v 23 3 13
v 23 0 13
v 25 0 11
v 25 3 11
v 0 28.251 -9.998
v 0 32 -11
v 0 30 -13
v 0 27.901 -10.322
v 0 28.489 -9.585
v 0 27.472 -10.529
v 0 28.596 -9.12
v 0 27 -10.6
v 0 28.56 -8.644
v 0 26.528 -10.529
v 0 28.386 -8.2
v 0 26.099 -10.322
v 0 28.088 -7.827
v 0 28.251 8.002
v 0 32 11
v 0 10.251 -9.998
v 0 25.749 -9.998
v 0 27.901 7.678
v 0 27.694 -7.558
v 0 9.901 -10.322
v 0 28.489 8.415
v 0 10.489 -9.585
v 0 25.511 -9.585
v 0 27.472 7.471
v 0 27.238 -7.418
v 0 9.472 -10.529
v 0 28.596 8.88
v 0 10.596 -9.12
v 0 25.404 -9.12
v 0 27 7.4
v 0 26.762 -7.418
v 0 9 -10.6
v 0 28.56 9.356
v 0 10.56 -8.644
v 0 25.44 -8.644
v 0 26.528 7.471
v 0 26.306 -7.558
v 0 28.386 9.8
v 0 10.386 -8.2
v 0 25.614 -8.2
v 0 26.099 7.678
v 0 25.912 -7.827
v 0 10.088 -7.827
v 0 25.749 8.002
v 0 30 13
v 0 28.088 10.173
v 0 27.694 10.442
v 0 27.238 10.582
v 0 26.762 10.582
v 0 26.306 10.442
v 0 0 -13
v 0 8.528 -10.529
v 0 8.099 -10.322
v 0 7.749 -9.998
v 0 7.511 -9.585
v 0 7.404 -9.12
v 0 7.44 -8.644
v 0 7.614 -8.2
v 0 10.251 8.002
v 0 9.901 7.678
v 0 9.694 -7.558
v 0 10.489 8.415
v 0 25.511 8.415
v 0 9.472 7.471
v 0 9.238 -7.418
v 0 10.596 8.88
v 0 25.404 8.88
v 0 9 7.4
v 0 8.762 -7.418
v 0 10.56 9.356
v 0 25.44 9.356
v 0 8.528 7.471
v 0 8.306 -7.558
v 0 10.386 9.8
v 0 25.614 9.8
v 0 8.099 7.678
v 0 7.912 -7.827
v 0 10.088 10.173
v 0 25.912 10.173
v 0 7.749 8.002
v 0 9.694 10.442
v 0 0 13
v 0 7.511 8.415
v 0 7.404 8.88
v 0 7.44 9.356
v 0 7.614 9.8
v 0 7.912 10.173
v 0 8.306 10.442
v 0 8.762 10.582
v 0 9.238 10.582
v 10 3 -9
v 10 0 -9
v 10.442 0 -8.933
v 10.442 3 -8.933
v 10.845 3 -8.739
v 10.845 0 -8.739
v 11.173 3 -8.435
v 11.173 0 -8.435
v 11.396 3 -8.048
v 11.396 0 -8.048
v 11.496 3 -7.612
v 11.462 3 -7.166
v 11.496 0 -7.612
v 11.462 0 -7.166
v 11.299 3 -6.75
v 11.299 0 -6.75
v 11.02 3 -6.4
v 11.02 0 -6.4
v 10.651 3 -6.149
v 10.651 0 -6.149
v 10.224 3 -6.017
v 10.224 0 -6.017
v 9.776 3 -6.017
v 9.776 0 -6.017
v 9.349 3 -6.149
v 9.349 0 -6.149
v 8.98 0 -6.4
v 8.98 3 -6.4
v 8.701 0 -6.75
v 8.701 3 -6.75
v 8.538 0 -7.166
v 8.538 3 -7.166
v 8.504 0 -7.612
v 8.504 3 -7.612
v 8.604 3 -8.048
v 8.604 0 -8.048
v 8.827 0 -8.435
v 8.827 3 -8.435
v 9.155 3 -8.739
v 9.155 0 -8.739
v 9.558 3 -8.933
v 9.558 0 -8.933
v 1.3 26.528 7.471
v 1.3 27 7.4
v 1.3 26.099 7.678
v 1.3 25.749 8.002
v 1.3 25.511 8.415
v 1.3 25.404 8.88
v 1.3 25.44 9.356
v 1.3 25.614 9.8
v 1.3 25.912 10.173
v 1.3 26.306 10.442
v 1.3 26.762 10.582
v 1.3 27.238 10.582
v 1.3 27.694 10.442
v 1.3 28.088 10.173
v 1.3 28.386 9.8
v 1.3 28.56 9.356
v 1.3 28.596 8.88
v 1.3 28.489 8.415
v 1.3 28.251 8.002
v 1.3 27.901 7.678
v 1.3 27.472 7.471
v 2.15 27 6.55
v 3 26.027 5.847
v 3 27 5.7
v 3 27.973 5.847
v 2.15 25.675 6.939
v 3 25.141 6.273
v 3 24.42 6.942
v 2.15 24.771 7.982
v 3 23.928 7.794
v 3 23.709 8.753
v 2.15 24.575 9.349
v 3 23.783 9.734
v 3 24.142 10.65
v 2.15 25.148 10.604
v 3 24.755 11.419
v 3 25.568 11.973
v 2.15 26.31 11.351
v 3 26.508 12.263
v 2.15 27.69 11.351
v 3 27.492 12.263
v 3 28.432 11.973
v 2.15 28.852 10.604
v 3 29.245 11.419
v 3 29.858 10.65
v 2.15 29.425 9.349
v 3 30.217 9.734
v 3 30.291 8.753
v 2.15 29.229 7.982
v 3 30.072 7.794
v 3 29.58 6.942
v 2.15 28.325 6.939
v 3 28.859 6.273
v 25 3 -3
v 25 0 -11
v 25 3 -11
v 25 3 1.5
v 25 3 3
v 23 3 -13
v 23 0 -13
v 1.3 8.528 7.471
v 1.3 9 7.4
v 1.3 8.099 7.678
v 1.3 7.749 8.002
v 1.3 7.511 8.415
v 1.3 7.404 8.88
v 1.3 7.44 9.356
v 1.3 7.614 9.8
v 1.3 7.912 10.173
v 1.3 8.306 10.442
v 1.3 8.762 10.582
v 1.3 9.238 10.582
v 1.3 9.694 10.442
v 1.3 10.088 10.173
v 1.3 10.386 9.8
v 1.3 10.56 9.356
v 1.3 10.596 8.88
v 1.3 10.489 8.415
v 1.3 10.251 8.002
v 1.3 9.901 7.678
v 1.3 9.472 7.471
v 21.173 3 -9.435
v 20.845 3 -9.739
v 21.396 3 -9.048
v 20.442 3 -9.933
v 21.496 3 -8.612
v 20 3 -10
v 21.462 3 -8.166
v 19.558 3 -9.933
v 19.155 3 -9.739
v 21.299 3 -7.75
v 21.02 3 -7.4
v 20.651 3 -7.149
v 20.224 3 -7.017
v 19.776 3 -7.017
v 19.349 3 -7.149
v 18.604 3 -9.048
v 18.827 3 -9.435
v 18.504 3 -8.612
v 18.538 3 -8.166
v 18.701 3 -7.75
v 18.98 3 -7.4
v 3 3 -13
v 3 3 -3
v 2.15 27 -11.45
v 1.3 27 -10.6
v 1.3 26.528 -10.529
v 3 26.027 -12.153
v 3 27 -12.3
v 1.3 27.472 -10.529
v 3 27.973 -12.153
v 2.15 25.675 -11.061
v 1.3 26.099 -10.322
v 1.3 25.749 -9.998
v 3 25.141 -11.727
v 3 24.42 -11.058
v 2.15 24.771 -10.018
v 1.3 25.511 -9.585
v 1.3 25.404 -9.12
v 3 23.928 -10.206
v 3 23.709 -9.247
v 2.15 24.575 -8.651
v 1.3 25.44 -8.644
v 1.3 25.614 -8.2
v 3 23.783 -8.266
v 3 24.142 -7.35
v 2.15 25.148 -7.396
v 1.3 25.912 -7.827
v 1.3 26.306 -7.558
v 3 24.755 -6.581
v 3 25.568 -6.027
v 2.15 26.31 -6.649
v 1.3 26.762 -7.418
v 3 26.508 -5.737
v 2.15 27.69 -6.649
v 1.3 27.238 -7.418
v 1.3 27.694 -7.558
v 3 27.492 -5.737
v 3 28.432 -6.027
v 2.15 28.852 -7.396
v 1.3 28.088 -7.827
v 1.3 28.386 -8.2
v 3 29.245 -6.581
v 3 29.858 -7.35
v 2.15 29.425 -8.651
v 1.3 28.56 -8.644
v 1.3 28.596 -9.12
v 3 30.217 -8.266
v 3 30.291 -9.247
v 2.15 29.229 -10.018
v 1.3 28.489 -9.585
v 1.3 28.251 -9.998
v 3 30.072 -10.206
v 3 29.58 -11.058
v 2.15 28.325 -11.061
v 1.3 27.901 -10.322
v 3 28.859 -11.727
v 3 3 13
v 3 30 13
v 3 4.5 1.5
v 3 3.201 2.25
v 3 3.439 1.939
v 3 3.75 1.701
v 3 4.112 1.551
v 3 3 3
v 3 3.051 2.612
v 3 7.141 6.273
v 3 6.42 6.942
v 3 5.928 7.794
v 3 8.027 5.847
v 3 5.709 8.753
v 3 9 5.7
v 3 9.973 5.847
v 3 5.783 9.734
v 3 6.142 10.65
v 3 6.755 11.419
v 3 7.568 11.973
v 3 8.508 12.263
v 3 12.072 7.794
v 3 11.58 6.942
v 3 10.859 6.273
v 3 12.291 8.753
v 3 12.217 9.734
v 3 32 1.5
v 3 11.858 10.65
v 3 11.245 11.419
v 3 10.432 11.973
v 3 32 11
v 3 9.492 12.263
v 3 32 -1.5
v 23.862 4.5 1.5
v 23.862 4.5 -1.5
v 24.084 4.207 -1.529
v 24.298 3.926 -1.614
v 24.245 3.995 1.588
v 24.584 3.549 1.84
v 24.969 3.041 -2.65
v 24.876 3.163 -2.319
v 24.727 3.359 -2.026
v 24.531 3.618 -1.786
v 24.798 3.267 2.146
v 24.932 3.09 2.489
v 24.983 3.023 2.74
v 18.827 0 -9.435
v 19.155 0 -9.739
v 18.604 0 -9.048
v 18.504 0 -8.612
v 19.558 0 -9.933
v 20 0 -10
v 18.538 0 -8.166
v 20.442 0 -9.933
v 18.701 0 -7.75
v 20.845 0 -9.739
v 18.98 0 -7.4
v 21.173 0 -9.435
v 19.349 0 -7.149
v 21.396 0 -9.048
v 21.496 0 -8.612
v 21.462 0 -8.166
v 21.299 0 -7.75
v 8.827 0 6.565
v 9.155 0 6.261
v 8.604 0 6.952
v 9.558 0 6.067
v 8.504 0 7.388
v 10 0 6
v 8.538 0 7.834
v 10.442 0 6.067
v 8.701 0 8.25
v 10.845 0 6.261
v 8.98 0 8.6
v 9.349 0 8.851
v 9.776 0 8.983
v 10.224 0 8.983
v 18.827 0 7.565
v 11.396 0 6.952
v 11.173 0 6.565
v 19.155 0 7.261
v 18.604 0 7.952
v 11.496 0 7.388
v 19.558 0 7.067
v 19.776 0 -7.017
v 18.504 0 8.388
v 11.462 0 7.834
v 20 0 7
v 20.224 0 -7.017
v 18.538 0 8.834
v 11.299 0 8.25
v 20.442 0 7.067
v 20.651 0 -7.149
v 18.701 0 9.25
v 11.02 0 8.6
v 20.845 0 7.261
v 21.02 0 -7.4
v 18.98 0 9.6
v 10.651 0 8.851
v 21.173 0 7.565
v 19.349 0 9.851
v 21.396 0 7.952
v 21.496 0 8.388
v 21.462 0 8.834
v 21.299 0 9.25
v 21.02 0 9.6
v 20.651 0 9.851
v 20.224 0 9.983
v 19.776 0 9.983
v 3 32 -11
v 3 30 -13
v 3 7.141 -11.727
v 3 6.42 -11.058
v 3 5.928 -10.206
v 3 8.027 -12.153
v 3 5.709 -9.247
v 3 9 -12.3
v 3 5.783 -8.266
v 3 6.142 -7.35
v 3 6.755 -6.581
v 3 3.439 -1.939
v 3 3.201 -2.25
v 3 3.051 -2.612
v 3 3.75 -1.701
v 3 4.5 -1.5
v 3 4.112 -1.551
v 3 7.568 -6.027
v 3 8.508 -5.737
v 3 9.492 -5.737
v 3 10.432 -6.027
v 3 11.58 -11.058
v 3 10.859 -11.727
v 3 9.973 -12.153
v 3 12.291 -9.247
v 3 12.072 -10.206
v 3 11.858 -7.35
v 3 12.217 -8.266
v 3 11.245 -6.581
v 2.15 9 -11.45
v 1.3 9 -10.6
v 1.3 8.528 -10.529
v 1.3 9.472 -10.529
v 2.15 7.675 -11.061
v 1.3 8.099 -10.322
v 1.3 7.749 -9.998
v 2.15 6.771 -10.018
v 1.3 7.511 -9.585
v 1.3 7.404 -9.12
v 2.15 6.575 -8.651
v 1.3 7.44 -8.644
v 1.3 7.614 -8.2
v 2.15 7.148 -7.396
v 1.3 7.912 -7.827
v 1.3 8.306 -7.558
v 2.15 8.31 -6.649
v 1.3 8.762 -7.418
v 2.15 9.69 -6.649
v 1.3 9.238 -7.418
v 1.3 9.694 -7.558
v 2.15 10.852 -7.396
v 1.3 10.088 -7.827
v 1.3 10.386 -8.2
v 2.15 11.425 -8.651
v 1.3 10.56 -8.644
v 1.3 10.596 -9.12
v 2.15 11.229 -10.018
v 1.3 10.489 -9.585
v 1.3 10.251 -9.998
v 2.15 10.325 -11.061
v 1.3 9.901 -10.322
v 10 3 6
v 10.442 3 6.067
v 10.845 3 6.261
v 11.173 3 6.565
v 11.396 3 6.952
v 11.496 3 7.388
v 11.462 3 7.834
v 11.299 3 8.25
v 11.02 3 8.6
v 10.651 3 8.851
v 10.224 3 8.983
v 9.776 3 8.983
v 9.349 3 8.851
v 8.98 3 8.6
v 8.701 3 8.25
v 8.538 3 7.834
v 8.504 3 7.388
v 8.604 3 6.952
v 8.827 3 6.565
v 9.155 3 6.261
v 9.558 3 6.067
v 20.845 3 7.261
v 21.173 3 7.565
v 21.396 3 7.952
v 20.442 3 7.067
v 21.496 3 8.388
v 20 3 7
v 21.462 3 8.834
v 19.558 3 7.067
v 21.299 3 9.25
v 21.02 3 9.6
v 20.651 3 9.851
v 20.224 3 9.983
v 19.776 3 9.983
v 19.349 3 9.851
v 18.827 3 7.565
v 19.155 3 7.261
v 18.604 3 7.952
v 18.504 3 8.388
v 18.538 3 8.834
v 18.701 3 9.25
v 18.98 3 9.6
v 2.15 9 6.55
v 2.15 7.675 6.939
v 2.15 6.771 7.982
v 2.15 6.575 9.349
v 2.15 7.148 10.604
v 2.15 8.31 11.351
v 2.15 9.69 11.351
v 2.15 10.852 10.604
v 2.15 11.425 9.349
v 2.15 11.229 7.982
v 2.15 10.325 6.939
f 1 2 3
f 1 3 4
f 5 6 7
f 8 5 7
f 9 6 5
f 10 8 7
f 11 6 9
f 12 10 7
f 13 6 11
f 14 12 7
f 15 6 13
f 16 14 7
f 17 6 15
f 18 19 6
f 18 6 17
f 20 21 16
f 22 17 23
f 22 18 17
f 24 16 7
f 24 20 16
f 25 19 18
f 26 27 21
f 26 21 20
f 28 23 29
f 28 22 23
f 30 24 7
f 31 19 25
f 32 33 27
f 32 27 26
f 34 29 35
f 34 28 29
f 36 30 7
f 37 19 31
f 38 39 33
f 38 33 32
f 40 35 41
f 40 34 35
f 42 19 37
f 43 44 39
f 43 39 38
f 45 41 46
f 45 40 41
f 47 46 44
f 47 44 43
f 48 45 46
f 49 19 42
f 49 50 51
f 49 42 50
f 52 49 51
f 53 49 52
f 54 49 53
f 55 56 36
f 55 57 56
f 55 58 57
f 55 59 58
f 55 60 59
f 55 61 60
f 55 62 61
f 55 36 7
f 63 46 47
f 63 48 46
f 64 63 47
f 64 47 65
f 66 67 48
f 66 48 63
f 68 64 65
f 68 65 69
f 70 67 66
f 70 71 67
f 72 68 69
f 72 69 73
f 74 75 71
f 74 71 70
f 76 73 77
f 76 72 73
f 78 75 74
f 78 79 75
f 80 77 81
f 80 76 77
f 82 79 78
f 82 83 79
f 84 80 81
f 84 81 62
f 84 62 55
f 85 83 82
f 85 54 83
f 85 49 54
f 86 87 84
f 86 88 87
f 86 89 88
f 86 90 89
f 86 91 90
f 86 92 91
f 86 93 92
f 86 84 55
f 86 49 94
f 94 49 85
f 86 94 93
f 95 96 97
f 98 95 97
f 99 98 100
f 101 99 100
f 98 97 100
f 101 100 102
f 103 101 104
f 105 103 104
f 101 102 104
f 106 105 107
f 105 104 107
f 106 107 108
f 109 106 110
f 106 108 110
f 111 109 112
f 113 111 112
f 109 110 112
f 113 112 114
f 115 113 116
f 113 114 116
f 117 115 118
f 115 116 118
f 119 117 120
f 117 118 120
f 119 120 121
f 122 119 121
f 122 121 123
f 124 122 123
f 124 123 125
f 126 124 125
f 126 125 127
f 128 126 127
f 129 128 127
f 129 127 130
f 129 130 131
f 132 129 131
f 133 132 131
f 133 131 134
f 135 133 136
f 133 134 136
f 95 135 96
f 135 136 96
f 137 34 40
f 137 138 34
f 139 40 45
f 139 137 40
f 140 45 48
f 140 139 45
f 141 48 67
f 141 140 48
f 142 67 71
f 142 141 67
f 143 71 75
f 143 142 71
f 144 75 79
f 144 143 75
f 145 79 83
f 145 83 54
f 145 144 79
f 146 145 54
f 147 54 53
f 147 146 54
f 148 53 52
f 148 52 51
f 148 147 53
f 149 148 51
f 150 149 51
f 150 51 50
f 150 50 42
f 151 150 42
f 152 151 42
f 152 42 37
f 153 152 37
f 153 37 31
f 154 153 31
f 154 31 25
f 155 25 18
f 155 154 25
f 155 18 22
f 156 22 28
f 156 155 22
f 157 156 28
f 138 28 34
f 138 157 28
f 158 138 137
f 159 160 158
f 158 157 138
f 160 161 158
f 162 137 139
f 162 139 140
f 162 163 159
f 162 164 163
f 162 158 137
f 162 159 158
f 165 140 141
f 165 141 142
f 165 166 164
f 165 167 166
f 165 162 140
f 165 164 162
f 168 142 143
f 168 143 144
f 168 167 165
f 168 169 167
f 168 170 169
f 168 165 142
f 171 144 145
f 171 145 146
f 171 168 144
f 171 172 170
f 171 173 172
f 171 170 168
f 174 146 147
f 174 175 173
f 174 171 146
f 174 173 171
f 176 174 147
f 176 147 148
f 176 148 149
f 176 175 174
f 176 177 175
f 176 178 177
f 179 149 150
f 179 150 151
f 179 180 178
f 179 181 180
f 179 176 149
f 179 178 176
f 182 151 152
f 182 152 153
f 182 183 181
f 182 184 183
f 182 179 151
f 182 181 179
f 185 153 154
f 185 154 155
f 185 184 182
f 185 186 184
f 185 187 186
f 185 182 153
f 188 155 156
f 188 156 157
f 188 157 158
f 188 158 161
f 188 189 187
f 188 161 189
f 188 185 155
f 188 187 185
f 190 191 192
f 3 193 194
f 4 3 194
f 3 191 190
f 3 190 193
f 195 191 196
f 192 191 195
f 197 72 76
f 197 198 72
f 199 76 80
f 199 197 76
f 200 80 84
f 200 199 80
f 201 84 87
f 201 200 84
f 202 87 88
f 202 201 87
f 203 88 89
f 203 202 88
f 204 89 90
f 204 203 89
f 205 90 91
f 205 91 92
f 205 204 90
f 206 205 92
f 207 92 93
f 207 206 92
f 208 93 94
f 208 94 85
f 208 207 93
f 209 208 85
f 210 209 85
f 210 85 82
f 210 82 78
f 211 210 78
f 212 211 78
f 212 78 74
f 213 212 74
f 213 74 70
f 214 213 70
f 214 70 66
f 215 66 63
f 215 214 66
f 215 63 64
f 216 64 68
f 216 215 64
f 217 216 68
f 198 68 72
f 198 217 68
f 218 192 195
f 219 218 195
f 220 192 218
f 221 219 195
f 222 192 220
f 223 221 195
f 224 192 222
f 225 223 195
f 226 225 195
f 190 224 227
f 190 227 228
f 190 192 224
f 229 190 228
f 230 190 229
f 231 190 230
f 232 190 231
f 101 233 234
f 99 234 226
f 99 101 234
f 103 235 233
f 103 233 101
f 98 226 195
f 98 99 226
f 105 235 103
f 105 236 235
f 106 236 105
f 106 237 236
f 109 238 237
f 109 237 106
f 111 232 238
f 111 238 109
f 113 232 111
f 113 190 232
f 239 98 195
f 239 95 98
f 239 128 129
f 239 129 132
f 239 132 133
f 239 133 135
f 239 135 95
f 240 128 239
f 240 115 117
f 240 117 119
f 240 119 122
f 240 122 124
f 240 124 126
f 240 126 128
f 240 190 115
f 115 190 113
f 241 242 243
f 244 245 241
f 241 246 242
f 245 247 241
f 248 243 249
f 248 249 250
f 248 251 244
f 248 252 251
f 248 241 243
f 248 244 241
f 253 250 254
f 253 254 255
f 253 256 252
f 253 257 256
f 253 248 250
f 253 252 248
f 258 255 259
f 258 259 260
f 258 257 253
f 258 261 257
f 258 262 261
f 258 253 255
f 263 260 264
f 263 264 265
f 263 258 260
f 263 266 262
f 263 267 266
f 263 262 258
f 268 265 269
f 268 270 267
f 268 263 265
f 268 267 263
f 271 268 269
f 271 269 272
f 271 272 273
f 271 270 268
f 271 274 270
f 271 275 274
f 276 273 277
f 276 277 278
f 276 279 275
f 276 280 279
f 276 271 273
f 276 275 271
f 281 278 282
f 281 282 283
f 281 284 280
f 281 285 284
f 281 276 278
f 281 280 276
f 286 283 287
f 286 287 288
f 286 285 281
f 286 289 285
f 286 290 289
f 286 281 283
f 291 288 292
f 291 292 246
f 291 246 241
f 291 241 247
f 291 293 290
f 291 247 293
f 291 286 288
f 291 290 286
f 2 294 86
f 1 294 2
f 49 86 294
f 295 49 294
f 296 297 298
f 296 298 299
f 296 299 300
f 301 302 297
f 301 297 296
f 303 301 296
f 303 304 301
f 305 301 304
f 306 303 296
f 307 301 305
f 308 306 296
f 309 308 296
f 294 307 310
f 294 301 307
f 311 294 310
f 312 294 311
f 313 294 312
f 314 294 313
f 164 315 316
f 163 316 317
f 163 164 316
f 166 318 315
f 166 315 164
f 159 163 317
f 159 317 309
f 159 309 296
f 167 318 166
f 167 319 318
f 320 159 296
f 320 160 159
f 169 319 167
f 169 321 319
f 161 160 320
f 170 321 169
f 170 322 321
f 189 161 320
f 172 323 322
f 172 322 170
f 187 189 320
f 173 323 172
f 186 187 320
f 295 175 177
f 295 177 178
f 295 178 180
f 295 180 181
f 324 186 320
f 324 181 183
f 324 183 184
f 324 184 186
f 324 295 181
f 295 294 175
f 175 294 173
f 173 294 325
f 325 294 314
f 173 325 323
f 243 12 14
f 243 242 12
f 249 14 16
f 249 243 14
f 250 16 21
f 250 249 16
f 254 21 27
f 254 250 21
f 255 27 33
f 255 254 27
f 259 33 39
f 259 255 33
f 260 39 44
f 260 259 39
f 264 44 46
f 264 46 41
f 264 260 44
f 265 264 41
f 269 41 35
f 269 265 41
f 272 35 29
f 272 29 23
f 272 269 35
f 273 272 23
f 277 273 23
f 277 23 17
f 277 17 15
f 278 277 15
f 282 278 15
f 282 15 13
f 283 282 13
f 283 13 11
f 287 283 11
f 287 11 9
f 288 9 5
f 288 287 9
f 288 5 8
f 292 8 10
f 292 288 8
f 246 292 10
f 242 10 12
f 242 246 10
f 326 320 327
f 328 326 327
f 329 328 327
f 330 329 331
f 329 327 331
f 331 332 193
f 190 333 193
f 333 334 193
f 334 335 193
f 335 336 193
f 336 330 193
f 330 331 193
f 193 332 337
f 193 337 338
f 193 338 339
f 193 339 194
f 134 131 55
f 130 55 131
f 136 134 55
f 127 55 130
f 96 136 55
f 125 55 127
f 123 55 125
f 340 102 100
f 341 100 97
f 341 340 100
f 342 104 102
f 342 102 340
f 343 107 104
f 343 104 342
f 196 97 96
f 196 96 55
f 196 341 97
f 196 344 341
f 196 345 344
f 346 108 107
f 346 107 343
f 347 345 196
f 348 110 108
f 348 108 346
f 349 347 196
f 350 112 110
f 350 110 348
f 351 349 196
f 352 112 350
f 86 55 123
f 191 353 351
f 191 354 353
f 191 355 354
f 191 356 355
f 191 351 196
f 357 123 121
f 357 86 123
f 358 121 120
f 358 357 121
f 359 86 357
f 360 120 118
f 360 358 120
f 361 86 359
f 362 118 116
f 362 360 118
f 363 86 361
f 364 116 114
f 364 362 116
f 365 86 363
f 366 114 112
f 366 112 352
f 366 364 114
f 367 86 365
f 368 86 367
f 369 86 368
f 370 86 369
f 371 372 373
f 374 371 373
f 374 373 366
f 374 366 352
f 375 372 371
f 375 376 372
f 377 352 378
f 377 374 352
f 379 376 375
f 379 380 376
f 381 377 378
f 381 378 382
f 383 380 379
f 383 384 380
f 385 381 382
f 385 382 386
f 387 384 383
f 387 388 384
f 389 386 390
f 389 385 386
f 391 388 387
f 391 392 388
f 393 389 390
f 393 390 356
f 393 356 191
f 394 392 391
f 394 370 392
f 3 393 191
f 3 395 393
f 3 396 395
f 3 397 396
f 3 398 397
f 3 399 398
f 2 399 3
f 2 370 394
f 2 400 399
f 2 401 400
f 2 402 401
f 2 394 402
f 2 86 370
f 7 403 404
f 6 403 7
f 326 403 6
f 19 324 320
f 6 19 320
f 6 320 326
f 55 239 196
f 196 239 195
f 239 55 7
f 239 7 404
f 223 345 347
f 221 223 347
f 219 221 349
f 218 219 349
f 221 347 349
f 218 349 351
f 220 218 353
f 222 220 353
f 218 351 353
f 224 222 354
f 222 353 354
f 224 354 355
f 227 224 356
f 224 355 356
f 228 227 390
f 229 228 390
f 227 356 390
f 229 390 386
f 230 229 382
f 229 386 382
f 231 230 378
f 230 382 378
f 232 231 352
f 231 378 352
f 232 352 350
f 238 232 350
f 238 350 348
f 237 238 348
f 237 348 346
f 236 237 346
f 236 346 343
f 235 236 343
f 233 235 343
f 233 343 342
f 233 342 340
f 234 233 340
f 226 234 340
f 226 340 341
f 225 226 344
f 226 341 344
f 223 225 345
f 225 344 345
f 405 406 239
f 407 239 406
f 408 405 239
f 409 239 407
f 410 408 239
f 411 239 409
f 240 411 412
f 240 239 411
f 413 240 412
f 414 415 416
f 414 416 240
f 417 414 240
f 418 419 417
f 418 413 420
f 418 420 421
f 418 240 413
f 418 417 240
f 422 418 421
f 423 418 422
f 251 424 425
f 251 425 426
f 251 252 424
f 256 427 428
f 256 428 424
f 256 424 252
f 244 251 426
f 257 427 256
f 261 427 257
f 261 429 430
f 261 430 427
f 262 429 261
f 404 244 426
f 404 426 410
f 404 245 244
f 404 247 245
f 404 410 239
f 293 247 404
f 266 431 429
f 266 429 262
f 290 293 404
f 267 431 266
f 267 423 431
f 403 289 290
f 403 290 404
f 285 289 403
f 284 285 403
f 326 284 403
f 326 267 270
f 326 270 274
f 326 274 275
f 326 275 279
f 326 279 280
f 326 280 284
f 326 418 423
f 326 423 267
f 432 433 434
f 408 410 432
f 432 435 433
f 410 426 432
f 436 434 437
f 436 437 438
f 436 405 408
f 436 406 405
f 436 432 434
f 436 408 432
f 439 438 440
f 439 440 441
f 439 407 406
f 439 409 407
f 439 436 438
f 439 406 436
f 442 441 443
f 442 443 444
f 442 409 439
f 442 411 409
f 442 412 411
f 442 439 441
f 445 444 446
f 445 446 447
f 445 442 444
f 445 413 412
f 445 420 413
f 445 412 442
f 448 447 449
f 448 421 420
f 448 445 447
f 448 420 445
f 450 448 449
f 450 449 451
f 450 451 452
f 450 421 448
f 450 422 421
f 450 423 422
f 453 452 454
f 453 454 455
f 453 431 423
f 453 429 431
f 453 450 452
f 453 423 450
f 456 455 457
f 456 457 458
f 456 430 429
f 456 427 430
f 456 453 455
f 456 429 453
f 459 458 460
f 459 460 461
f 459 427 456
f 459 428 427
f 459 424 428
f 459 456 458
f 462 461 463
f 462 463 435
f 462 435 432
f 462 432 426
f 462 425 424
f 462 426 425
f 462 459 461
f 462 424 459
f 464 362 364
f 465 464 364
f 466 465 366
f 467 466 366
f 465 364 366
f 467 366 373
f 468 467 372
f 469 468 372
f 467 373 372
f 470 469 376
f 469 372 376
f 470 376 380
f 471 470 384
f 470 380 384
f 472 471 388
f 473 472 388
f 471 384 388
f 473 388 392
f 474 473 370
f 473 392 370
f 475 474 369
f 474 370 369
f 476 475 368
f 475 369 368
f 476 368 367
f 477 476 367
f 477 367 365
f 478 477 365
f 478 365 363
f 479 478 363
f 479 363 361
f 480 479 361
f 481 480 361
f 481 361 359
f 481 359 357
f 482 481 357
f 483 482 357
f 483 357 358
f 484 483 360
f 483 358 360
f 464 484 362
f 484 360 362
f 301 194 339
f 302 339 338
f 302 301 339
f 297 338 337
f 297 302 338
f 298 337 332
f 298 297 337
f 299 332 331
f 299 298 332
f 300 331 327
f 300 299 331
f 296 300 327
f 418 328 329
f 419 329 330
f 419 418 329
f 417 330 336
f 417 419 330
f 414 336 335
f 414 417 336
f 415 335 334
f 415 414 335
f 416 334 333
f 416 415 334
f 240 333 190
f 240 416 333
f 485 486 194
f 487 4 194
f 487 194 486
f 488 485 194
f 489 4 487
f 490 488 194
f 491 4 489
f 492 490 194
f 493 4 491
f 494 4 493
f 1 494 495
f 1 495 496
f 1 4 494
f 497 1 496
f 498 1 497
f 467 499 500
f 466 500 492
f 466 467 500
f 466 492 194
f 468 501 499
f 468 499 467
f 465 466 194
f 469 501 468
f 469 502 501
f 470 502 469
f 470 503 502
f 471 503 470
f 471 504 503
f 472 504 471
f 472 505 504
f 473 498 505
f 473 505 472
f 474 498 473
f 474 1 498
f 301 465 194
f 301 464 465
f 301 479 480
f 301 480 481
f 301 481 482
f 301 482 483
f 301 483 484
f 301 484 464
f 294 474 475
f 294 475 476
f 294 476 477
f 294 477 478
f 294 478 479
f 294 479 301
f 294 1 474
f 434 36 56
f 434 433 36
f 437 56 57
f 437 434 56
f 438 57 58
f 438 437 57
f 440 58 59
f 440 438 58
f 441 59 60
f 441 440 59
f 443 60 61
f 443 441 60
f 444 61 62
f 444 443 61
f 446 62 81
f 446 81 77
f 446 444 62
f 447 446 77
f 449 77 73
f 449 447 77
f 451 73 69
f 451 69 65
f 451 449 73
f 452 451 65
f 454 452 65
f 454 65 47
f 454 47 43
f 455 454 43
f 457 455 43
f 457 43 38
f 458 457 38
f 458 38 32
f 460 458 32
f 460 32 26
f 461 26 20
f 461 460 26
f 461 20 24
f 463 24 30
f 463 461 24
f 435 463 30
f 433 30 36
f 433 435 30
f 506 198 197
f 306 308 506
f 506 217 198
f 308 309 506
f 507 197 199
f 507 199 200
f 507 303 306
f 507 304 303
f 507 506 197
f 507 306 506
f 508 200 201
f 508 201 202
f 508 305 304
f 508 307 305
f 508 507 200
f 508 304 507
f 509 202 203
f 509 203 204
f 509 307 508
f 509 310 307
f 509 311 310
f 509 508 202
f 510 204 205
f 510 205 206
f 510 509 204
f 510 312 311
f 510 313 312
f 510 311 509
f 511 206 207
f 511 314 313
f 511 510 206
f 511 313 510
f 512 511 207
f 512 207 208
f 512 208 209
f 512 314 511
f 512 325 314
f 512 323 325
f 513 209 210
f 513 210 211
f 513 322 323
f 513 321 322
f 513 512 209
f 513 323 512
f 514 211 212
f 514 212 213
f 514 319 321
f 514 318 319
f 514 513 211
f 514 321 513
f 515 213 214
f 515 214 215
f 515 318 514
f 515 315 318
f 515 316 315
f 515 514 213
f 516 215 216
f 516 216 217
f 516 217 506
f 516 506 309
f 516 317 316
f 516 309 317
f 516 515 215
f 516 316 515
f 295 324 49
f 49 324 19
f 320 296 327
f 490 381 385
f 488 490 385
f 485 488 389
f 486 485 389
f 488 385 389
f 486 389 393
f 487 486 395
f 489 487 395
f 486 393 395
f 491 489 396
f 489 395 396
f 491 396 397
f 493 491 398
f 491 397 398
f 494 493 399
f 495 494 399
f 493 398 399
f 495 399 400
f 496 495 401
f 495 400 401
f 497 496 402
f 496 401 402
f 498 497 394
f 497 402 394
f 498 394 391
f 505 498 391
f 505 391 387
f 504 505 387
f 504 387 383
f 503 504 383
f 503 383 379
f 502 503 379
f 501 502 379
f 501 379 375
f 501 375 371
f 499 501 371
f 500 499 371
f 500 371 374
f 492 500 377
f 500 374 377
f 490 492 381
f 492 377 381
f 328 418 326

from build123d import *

# Parameters (mm, degrees)
EXTRUDE_1_DEPTH          = 13
SKETCH_4_R               = 1.5
CUT_EXTRUDE_1_DEPTH      = 3
EXTRUDE_2_DEPTH          = 1.5
CHAMFER_1_SIZE           = 2
FILLET_1_R               = 1.5
HOLE_WIZARD_1_AT_2_COUNT = 2
HOLE_WIZARD_1_AT_2_PITCH = 18
HOLE_WIZARD_1_AT_3_COUNT = 2
HOLE_WIZARD_1_AT_3_PITCH = 25.455844123
HOLE_WIZARD_1_AT_4_COUNT = 2
HOLE_WIZARD_1_AT_4_PITCH = 18


with BuildPart() as part:
    # 草图1 → 凸台-拉伸1 (new, symmetric)
    with BuildSketch(Plane.XY):
        Polygon((0, 0), (25, 0), (25, 3), (3, 3), (3, 32), (0, 32), align=None)
    extrude(amount=EXTRUDE_1_DEPTH, both=True)

    # 草图4 → 切除-拉伸1 (cut)
    with BuildSketch(Plane.XZ):
        with Locations(Location((10, -7.5, 0), (0, 0, 270))):
            Circle(SKETCH_4_R)
        with Locations(Location((10, 7.5, 0), (0, 0, 270))):
            Circle(SKETCH_4_R)
        with Locations(Location((20, 8.5, 0), (0, 0, 270))):
            Circle(SKETCH_4_R)
        with Locations(Location((20, -8.5, 0), (0, 0, 270))):
            Circle(SKETCH_4_R)
    extrude(amount=-CUT_EXTRUDE_1_DEPTH, mode=Mode.SUBTRACT)

    # 草图2 → 凸台-拉伸2 (add, symmetric)
    with BuildSketch(Plane.XY):
        Polygon((3, 32), (3, 3), (25, 3), align=None)
    extrude(amount=EXTRUDE_2_DEPTH, both=True)

    # 倒角1
    chamfer_1_edges = [part.edges().sort_by_distance(p)[0] for p in [
        (25, 1.5, 13),
        (1.5, 32, 13),
        (1.5, 32, -13),
        (25, 1.5, -13),
    ]]
    chamfer(chamfer_1_edges, length=CHAMFER_1_SIZE)

    # 圆角1
    # the kernel refuses this fillet: 1.5 mm, written as the material it adds along each edge
    with BuildSketch(Plane(origin=(3, 3, -1.5), x_dir=(0, 0, -1), z_dir=(1, 0, 0))) as fillet_1_piece_1_section:
        with BuildLine():
            CenterArc((FILLET_1_R, FILLET_1_R), FILLET_1_R, 180, 90)
            Line((0, FILLET_1_R), (0, 0))
            Line((0, 0), (FILLET_1_R, 0))
        make_face()
    fillet_1_piece_1 = extrude(amount=25.75, mode=Mode.PRIVATE)
    fillet_1_piece_1 = split(fillet_1_piece_1, bisect_by=Plane(origin=(20.775844012, 8.568205621, -1.836675405), z_dir=(-0.7966912709023963, -0.6043864813742318, 0)), keep=Keep.TOP, mode=Mode.PRIVATE)
    add(fillet_1_piece_1)
    with BuildSketch(Plane(origin=(3, 3, 1.5), x_dir=(0, 0, 1), z_dir=(1, 0, 0))) as fillet_1_piece_2_section:
        with BuildLine():
            CenterArc((FILLET_1_R, -FILLET_1_R), FILLET_1_R, 90, 90)
            Line((0, -FILLET_1_R), (0, 0))
            Line((0, 0), (FILLET_1_R, 0))
        make_face()
    fillet_1_piece_2 = extrude(amount=25.75, mode=Mode.PRIVATE)
    fillet_1_piece_2 = split(fillet_1_piece_2, bisect_by=Plane(origin=(20.775844012, 8.568205621, 1.836675405), z_dir=(-0.7966912709023963, -0.6043864813742318, 0)), keep=Keep.TOP, mode=Mode.PRIVATE)
    add(fillet_1_piece_2)

    # 草图6 → 打孔尺寸(%根据)开槽半沉头木螺钉的类型1 (revolve, cut)
    with BuildSketch(Plane(origin=(3, 9, -9), x_dir=(0, 0, -1), z_dir=(0, 1, 0))):
        Polygon((0, 0), (0, 3), (1.6, 3), (1.6, 1.7), (3.3, 0), align=None)
    hole_wizard_1 = revolve(axis=Axis((9.35, 9, -9), (-1, 0, 0)), mode=Mode.SUBTRACT)

    # 打孔尺寸(%根据)开槽半沉头木螺钉的类型1 at 2: 打孔尺寸(%根据)开槽半沉头木螺钉的类型1 ×2
    with Locations(*[(0, 0, i * HOLE_WIZARD_1_AT_2_PITCH) for i in range(1, HOLE_WIZARD_1_AT_2_COUNT)]):
        add(hole_wizard_1, mode=Mode.SUBTRACT)

    # 打孔尺寸(%根据)开槽半沉头木螺钉的类型1 at 3: 打孔尺寸(%根据)开槽半沉头木螺钉的类型1 ×2
    with Locations(*[Vector(0, 0.7071067811865476, 0.7071067811865476) * (i * HOLE_WIZARD_1_AT_3_PITCH) for i in range(1, HOLE_WIZARD_1_AT_3_COUNT)]):
        add(hole_wizard_1, mode=Mode.SUBTRACT)

    # 打孔尺寸(%根据)开槽半沉头木螺钉的类型1 at 4: 打孔尺寸(%根据)开槽半沉头木螺钉的类型1 ×2
    with Locations(*[(0, i * HOLE_WIZARD_1_AT_4_PITCH, 0) for i in range(1, HOLE_WIZARD_1_AT_4_COUNT)]):
        add(hole_wizard_1, mode=Mode.SUBTRACT)


solid = part.part
